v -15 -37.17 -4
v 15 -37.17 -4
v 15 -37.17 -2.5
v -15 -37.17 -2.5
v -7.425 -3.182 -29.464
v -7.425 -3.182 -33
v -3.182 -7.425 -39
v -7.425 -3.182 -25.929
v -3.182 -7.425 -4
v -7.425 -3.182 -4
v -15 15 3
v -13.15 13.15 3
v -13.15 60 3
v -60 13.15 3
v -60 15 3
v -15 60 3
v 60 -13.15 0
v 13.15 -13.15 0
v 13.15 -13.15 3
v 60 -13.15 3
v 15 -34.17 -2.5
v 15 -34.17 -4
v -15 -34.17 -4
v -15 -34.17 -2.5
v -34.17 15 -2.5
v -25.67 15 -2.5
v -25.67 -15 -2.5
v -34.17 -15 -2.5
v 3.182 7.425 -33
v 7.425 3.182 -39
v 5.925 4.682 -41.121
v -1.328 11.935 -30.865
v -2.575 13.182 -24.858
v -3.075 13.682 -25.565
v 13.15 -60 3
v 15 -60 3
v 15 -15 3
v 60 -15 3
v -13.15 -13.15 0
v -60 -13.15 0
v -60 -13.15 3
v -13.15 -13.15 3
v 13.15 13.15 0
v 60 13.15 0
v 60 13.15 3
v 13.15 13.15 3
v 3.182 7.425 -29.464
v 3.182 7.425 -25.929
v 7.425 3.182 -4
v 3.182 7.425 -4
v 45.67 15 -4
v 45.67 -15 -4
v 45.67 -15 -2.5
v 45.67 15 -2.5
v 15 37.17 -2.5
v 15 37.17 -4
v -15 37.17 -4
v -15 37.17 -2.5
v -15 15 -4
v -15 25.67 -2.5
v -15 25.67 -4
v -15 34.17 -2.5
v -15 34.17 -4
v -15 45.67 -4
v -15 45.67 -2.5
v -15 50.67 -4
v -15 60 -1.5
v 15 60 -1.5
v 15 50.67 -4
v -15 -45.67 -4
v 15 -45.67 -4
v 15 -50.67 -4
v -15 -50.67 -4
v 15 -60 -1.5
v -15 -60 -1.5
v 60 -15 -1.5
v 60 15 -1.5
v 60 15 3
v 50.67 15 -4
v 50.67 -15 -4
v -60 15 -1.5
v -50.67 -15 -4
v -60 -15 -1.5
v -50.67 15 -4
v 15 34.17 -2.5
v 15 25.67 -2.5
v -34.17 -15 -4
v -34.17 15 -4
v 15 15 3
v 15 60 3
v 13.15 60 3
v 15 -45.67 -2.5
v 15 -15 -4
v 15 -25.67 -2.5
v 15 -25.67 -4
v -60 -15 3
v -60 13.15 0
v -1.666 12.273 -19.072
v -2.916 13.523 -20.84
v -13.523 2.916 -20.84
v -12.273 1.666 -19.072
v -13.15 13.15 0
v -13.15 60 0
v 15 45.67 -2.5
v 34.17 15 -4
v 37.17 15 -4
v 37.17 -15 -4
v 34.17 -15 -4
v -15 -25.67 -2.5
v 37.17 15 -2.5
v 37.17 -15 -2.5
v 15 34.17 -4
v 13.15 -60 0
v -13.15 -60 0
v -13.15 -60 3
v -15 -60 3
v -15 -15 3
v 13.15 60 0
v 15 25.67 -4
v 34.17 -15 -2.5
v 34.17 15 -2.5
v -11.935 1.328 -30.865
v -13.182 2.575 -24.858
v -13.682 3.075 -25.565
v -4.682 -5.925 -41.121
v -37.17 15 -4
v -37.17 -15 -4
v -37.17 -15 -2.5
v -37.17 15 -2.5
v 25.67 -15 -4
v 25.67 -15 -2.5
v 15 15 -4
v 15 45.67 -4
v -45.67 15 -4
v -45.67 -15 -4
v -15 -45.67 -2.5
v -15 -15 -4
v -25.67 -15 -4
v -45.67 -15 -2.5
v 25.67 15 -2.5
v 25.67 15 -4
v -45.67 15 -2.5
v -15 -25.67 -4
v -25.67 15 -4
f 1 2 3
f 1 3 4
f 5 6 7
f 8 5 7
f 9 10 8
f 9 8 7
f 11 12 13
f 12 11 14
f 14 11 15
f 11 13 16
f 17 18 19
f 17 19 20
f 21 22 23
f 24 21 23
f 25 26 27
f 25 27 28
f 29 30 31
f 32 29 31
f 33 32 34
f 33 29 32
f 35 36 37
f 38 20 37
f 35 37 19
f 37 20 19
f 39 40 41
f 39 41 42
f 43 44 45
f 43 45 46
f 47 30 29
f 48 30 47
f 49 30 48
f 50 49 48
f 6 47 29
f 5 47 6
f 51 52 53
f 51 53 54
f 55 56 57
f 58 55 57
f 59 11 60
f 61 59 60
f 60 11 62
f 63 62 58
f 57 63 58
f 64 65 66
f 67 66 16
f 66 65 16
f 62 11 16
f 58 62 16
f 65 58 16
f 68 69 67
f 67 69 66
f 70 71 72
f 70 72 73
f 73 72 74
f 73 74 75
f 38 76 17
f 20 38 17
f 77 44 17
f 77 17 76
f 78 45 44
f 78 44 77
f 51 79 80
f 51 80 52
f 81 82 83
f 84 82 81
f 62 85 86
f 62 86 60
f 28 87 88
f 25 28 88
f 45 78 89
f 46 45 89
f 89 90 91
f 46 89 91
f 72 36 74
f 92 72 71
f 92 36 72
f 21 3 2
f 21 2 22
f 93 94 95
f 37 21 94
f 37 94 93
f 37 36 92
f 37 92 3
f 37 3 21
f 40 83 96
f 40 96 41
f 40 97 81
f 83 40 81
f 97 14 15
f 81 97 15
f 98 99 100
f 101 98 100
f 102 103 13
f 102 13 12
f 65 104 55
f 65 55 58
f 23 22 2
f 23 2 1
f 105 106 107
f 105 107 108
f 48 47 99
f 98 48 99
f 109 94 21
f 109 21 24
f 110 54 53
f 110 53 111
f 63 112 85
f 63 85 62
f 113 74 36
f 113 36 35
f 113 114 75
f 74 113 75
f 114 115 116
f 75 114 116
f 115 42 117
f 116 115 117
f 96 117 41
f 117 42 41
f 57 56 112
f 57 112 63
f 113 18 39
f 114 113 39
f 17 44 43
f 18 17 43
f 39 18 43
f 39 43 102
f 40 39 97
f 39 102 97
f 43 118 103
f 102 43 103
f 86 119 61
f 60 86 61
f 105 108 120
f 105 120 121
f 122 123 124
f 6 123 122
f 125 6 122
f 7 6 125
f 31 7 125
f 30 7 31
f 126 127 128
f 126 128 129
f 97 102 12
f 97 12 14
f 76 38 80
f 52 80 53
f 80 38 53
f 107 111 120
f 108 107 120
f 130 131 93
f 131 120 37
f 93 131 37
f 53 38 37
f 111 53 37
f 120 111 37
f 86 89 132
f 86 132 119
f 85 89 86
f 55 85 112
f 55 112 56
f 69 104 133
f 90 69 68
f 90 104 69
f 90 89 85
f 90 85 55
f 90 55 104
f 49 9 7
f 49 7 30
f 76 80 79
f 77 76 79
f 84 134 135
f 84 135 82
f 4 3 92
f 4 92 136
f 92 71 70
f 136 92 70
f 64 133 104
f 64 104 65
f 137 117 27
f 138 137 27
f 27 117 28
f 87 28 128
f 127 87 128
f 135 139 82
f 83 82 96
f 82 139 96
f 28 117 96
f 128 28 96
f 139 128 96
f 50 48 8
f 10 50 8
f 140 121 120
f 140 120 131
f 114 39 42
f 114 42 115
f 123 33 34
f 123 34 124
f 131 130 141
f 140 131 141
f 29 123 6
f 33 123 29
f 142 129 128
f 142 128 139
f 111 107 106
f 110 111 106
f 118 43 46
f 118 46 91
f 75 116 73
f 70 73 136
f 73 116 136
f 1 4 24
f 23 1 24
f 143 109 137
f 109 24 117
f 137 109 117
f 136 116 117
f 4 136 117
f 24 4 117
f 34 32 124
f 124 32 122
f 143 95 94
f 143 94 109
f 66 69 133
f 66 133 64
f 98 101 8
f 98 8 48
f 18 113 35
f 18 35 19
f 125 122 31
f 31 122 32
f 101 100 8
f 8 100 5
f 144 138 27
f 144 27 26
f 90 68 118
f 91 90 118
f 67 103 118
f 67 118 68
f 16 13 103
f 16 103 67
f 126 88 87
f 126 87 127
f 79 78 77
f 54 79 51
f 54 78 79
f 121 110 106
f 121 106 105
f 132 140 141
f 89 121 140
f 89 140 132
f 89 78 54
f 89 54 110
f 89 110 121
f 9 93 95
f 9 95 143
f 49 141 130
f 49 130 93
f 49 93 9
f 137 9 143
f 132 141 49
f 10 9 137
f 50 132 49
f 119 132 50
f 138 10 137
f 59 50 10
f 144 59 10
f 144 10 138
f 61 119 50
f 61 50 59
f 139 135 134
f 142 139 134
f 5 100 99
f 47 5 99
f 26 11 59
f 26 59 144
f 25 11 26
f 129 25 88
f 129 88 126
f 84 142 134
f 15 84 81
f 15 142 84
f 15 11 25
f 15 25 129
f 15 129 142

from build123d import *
from OCP.BRepFilletAPI import BRepFilletAPI_MakeChamfer

# Parameters (mm, degrees)
SKETCH1_W           = 1.85
SKETCH1_H           = 38.85
SKETCH1_H_2         = 6.15
SKETCH1_W_2         = 44.85
SKETCH1_H_3         = 1.85
SKETCH1_W_3         = 0.15
BOSS_EXTRUDE1_DEPTH = 3
SKETCH1_4_W         = 120
SKETCH1_4_H         = 30
SKETCH1_4_W_2       = 30
SKETCH1_4_H_2       = 120
BOSS_EXTRUDE3_DEPTH = 4
CHAMFER1_SIZE       = 2.5
CHAMFER1_SIZE2      = 9.330127019
SKETCH4_W           = 8.5
SKETCH4_H           = 30
SKETCH4_W_2         = 30
SKETCH4_H_2         = 8.5
CUT_EXTRUDE1_DEPTH  = 1.5
BOSS_EXTRUDE4_DEPTH = 35
CHAMFER2_SIZE       = 6
BOSS_EXTRUDE5_DEPTH = 3
CHAMFER3_SIZE       = 2
CHAMFER3_SIZE2      = 5.494954839
BOSS_EXTRUDE6_DEPTH = 2.5


with BuildPart() as part:
    # Sketch1 → Boss-Extrude1 (new body)
    with BuildSketch(Plane(origin=(0, 0, 0), x_dir=(-1, 0, 0), z_dir=(0, 0, -1))):
        with Locations((14.075, 40.575)):
            Rectangle(SKETCH1_W, SKETCH1_H)
        with Locations((14.075, 18.075)):
            Rectangle(SKETCH1_W, SKETCH1_H_2)
        with Locations((37.575, 14.075)):
            Rectangle(SKETCH1_W_2, SKETCH1_H_3)
        with Locations((14.075, 14.075)):
            Rectangle(SKETCH1_W, SKETCH1_H_3)
        with Locations((14.075, -14.075)):
            Rectangle(SKETCH1_W, SKETCH1_H_3)
        with Locations((14.075, -18.075)):
            Rectangle(SKETCH1_W, SKETCH1_H_2)
        with Locations((37.575, -14.075)):
            Rectangle(SKETCH1_W_2, SKETCH1_H_3)
        with Locations((14.075, -40.575)):
            Rectangle(SKETCH1_W, SKETCH1_H)
        with Locations((-14.075, -14.075)):
            Rectangle(SKETCH1_W, SKETCH1_H_3)
        with Locations((-14.075, -18.075)):
            Rectangle(SKETCH1_W, SKETCH1_H_2)
        with Locations((-37.575, -14.075)):
            Rectangle(SKETCH1_W_2, SKETCH1_H_3)
        with Locations((-15.075, -14.075)):
            Rectangle(SKETCH1_W_3, SKETCH1_H_3)
        with Locations((15.075, -14.075)):
            Rectangle(SKETCH1_W_3, SKETCH1_H_3)
        with Locations((15.075, 14.075)):
            Rectangle(SKETCH1_W_3, SKETCH1_H_3)
        with Locations((-37.575, 14.075)):
            Rectangle(SKETCH1_W_2, SKETCH1_H_3)
        with Locations((-15.075, 14.075)):
            Rectangle(SKETCH1_W_3, SKETCH1_H_3)
        with Locations((-14.075, 18.075)):
            Rectangle(SKETCH1_W, SKETCH1_H_2)
        with Locations((-14.075, 14.075)):
            Rectangle(SKETCH1_W, SKETCH1_H_3)
        with Locations((-14.075, 40.575)):
            Rectangle(SKETCH1_W, SKETCH1_H)
        with Locations((-14.075, -40.575)):
            Rectangle(SKETCH1_W, SKETCH1_H)
    extrude(amount=-BOSS_EXTRUDE1_DEPTH)

    # Sketch1<4> → Boss-Extrude3 (add)
    with BuildSketch(Plane(origin=(0, 0, 0), x_dir=(-1, 0, 0), z_dir=(0, 0, -1))):
        Rectangle(SKETCH1_4_W, SKETCH1_4_H)
        Rectangle(SKETCH1_4_W_2, SKETCH1_4_H_2)
    extrude(amount=BOSS_EXTRUDE3_DEPTH)

    # Chamfer1: one chamfer whose edges measure the first distance from different faces: ONE call of the kernel's chamfer builder (chamfer() names one face for all edges)
    chamfer1_edges_1 = [part.edges().sort_by_distance(p)[0] for p in [
        (60, 0, -4),
    ]]
    chamfer1_side_1 = [part.faces().sort_by_distance(p)[0] for p in [
        (60, 0, -1.703661327),
    ]]
    chamfer1_edges_2 = [part.edges().sort_by_distance(p)[0] for p in [
        (0, 60, -4),
    ]]
    chamfer1_side_2 = [part.faces().sort_by_distance(p)[0] for p in [
        (0, 60, -1.703661327),
    ]]
    chamfer1_edges_3 = [part.edges().sort_by_distance(p)[0] for p in [
        (0, -60, -4),
    ]]
    chamfer1_side_3 = [part.faces().sort_by_distance(p)[0] for p in [
        (0, -60, -1.703661327),
    ]]
    chamfer1_edges_4 = [part.edges().sort_by_distance(p)[0] for p in [
        (-60, 0, -4),
    ]]
    chamfer1_side_4 = [part.faces().sort_by_distance(p)[0] for p in [
        (-60, 0, -1.703661327),
    ]]
    chamfer1 = BRepFilletAPI_MakeChamfer(part.part.solid().wrapped)
    for e in chamfer1_edges_1:
        chamfer1.Add(CHAMFER1_SIZE, CHAMFER1_SIZE2, e.wrapped, chamfer1_side_1[0].wrapped)  # the first distance lies on this face
    for e in chamfer1_edges_2:
        chamfer1.Add(CHAMFER1_SIZE, CHAMFER1_SIZE2, e.wrapped, chamfer1_side_2[0].wrapped)  # the first distance lies on this face
    for e in chamfer1_edges_3:
        chamfer1.Add(CHAMFER1_SIZE, CHAMFER1_SIZE2, e.wrapped, chamfer1_side_3[0].wrapped)  # the first distance lies on this face
    for e in chamfer1_edges_4:
        chamfer1.Add(CHAMFER1_SIZE, CHAMFER1_SIZE2, e.wrapped, chamfer1_side_4[0].wrapped)  # the first distance lies on this face
    add(Compound.cast(chamfer1.Shape()), mode=Mode.REPLACE)

    # Sketch4 → Cut-Extrude1 (cut)
    with BuildSketch(Plane(origin=(0, 0, -4), x_dir=(-1, 0, 0), z_dir=(0, 0, -1))):
        with Locations((-41.419872981, 0)):
            Rectangle(SKETCH4_W, SKETCH4_H)
        with Locations((-29.919872981, 0)):
            Rectangle(SKETCH4_W, SKETCH4_H)
        with Locations((0, 41.419872981)):
            Rectangle(SKETCH4_W_2, SKETCH4_H_2)
        with Locations((0, 29.919872981)):
            Rectangle(SKETCH4_W_2, SKETCH4_H_2)
        with Locations((29.919872981, 0)):
            Rectangle(SKETCH4_W, SKETCH4_H)
        with Locations((41.419872981, 0)):
            Rectangle(SKETCH4_W, SKETCH4_H)
        with Locations((0, -29.919872981)):
            Rectangle(SKETCH4_W_2, SKETCH4_H_2)
        with Locations((0, -41.419872981)):
            Rectangle(SKETCH4_W_2, SKETCH4_H_2)
    extrude(amount=-CUT_EXTRUDE1_DEPTH, mode=Mode.SUBTRACT)

    # Sketch5 → Boss-Extrude4 (add)
    with BuildSketch(Plane(origin=(0, 0, -4), x_dir=(-1, 0, 0), z_dir=(0, 0, -1))):
        Polygon((-7.424621202, 3.181980515), (-3.181980515, 7.424621202), (7.424621202, -3.181980515), (3.181980515, -7.424621202), align=None)
    extrude(amount=BOSS_EXTRUDE4_DEPTH)

    # Chamfer2
    chamfer2_edges = [part.edges().sort_by_distance(p)[0] for p in [
        (-2.121320344, 2.121320344, -39),
    ]]
    chamfer(chamfer2_edges, length=CHAMFER2_SIZE - 0.0001)  # a hair under: the kernel refuses the full size

    # Sketch6 → Boss-Extrude5 (add)
    with BuildSketch(Plane(origin=(-12.727922061, 12.727922061, -18), x_dir=(-0.8660254037844379, -0.28867513459481464, 0.4082482904638634), z_dir=(-0.5000000000000013, 0.5000000000000013, -0.7071067811865458))):
        Polygon((-23.270152556, -19.918584287), (-11.723147173, -3.588652668), (0.524301541, -12.248906706), (-11.022703843, -28.578838325), align=None)
    extrude(amount=BOSS_EXTRUDE5_DEPTH)

    # Chamfer3
    chamfer3_edges = [part.edges().sort_by_distance(p)[0] for p in [
        (-9.378679656, 9.378679656, -26.97918472),
    ]]
    chamfer3_side = [part.faces().sort_by_distance(p)[0] for p in [
        (-8.628679656, 8.628679656, -25.918524548),
    ]]
    chamfer(chamfer3_edges, length=CHAMFER3_SIZE, length2=CHAMFER3_SIZE2, reference=chamfer3_side[0])

    # Sketch8 → Boss-Extrude6 (add)
    with BuildSketch(Plane(origin=(-11.477922061, 11.477922061, -16.232233047), x_dir=(0.8660254037844378, 0.28867513459481475, -0.4082482904638635), z_dir=(0.5000000000000016, -0.5000000000000013, 0.7071067811865456))):
        Polygon((6.123724357, -21.650635095), (18.371173071, -12.990381057), (9.885891697, -0.990381057), (-2.361557017, -9.650635095), align=None)
    extrude(amount=BOSS_EXTRUDE6_DEPTH)


solid = part.part
